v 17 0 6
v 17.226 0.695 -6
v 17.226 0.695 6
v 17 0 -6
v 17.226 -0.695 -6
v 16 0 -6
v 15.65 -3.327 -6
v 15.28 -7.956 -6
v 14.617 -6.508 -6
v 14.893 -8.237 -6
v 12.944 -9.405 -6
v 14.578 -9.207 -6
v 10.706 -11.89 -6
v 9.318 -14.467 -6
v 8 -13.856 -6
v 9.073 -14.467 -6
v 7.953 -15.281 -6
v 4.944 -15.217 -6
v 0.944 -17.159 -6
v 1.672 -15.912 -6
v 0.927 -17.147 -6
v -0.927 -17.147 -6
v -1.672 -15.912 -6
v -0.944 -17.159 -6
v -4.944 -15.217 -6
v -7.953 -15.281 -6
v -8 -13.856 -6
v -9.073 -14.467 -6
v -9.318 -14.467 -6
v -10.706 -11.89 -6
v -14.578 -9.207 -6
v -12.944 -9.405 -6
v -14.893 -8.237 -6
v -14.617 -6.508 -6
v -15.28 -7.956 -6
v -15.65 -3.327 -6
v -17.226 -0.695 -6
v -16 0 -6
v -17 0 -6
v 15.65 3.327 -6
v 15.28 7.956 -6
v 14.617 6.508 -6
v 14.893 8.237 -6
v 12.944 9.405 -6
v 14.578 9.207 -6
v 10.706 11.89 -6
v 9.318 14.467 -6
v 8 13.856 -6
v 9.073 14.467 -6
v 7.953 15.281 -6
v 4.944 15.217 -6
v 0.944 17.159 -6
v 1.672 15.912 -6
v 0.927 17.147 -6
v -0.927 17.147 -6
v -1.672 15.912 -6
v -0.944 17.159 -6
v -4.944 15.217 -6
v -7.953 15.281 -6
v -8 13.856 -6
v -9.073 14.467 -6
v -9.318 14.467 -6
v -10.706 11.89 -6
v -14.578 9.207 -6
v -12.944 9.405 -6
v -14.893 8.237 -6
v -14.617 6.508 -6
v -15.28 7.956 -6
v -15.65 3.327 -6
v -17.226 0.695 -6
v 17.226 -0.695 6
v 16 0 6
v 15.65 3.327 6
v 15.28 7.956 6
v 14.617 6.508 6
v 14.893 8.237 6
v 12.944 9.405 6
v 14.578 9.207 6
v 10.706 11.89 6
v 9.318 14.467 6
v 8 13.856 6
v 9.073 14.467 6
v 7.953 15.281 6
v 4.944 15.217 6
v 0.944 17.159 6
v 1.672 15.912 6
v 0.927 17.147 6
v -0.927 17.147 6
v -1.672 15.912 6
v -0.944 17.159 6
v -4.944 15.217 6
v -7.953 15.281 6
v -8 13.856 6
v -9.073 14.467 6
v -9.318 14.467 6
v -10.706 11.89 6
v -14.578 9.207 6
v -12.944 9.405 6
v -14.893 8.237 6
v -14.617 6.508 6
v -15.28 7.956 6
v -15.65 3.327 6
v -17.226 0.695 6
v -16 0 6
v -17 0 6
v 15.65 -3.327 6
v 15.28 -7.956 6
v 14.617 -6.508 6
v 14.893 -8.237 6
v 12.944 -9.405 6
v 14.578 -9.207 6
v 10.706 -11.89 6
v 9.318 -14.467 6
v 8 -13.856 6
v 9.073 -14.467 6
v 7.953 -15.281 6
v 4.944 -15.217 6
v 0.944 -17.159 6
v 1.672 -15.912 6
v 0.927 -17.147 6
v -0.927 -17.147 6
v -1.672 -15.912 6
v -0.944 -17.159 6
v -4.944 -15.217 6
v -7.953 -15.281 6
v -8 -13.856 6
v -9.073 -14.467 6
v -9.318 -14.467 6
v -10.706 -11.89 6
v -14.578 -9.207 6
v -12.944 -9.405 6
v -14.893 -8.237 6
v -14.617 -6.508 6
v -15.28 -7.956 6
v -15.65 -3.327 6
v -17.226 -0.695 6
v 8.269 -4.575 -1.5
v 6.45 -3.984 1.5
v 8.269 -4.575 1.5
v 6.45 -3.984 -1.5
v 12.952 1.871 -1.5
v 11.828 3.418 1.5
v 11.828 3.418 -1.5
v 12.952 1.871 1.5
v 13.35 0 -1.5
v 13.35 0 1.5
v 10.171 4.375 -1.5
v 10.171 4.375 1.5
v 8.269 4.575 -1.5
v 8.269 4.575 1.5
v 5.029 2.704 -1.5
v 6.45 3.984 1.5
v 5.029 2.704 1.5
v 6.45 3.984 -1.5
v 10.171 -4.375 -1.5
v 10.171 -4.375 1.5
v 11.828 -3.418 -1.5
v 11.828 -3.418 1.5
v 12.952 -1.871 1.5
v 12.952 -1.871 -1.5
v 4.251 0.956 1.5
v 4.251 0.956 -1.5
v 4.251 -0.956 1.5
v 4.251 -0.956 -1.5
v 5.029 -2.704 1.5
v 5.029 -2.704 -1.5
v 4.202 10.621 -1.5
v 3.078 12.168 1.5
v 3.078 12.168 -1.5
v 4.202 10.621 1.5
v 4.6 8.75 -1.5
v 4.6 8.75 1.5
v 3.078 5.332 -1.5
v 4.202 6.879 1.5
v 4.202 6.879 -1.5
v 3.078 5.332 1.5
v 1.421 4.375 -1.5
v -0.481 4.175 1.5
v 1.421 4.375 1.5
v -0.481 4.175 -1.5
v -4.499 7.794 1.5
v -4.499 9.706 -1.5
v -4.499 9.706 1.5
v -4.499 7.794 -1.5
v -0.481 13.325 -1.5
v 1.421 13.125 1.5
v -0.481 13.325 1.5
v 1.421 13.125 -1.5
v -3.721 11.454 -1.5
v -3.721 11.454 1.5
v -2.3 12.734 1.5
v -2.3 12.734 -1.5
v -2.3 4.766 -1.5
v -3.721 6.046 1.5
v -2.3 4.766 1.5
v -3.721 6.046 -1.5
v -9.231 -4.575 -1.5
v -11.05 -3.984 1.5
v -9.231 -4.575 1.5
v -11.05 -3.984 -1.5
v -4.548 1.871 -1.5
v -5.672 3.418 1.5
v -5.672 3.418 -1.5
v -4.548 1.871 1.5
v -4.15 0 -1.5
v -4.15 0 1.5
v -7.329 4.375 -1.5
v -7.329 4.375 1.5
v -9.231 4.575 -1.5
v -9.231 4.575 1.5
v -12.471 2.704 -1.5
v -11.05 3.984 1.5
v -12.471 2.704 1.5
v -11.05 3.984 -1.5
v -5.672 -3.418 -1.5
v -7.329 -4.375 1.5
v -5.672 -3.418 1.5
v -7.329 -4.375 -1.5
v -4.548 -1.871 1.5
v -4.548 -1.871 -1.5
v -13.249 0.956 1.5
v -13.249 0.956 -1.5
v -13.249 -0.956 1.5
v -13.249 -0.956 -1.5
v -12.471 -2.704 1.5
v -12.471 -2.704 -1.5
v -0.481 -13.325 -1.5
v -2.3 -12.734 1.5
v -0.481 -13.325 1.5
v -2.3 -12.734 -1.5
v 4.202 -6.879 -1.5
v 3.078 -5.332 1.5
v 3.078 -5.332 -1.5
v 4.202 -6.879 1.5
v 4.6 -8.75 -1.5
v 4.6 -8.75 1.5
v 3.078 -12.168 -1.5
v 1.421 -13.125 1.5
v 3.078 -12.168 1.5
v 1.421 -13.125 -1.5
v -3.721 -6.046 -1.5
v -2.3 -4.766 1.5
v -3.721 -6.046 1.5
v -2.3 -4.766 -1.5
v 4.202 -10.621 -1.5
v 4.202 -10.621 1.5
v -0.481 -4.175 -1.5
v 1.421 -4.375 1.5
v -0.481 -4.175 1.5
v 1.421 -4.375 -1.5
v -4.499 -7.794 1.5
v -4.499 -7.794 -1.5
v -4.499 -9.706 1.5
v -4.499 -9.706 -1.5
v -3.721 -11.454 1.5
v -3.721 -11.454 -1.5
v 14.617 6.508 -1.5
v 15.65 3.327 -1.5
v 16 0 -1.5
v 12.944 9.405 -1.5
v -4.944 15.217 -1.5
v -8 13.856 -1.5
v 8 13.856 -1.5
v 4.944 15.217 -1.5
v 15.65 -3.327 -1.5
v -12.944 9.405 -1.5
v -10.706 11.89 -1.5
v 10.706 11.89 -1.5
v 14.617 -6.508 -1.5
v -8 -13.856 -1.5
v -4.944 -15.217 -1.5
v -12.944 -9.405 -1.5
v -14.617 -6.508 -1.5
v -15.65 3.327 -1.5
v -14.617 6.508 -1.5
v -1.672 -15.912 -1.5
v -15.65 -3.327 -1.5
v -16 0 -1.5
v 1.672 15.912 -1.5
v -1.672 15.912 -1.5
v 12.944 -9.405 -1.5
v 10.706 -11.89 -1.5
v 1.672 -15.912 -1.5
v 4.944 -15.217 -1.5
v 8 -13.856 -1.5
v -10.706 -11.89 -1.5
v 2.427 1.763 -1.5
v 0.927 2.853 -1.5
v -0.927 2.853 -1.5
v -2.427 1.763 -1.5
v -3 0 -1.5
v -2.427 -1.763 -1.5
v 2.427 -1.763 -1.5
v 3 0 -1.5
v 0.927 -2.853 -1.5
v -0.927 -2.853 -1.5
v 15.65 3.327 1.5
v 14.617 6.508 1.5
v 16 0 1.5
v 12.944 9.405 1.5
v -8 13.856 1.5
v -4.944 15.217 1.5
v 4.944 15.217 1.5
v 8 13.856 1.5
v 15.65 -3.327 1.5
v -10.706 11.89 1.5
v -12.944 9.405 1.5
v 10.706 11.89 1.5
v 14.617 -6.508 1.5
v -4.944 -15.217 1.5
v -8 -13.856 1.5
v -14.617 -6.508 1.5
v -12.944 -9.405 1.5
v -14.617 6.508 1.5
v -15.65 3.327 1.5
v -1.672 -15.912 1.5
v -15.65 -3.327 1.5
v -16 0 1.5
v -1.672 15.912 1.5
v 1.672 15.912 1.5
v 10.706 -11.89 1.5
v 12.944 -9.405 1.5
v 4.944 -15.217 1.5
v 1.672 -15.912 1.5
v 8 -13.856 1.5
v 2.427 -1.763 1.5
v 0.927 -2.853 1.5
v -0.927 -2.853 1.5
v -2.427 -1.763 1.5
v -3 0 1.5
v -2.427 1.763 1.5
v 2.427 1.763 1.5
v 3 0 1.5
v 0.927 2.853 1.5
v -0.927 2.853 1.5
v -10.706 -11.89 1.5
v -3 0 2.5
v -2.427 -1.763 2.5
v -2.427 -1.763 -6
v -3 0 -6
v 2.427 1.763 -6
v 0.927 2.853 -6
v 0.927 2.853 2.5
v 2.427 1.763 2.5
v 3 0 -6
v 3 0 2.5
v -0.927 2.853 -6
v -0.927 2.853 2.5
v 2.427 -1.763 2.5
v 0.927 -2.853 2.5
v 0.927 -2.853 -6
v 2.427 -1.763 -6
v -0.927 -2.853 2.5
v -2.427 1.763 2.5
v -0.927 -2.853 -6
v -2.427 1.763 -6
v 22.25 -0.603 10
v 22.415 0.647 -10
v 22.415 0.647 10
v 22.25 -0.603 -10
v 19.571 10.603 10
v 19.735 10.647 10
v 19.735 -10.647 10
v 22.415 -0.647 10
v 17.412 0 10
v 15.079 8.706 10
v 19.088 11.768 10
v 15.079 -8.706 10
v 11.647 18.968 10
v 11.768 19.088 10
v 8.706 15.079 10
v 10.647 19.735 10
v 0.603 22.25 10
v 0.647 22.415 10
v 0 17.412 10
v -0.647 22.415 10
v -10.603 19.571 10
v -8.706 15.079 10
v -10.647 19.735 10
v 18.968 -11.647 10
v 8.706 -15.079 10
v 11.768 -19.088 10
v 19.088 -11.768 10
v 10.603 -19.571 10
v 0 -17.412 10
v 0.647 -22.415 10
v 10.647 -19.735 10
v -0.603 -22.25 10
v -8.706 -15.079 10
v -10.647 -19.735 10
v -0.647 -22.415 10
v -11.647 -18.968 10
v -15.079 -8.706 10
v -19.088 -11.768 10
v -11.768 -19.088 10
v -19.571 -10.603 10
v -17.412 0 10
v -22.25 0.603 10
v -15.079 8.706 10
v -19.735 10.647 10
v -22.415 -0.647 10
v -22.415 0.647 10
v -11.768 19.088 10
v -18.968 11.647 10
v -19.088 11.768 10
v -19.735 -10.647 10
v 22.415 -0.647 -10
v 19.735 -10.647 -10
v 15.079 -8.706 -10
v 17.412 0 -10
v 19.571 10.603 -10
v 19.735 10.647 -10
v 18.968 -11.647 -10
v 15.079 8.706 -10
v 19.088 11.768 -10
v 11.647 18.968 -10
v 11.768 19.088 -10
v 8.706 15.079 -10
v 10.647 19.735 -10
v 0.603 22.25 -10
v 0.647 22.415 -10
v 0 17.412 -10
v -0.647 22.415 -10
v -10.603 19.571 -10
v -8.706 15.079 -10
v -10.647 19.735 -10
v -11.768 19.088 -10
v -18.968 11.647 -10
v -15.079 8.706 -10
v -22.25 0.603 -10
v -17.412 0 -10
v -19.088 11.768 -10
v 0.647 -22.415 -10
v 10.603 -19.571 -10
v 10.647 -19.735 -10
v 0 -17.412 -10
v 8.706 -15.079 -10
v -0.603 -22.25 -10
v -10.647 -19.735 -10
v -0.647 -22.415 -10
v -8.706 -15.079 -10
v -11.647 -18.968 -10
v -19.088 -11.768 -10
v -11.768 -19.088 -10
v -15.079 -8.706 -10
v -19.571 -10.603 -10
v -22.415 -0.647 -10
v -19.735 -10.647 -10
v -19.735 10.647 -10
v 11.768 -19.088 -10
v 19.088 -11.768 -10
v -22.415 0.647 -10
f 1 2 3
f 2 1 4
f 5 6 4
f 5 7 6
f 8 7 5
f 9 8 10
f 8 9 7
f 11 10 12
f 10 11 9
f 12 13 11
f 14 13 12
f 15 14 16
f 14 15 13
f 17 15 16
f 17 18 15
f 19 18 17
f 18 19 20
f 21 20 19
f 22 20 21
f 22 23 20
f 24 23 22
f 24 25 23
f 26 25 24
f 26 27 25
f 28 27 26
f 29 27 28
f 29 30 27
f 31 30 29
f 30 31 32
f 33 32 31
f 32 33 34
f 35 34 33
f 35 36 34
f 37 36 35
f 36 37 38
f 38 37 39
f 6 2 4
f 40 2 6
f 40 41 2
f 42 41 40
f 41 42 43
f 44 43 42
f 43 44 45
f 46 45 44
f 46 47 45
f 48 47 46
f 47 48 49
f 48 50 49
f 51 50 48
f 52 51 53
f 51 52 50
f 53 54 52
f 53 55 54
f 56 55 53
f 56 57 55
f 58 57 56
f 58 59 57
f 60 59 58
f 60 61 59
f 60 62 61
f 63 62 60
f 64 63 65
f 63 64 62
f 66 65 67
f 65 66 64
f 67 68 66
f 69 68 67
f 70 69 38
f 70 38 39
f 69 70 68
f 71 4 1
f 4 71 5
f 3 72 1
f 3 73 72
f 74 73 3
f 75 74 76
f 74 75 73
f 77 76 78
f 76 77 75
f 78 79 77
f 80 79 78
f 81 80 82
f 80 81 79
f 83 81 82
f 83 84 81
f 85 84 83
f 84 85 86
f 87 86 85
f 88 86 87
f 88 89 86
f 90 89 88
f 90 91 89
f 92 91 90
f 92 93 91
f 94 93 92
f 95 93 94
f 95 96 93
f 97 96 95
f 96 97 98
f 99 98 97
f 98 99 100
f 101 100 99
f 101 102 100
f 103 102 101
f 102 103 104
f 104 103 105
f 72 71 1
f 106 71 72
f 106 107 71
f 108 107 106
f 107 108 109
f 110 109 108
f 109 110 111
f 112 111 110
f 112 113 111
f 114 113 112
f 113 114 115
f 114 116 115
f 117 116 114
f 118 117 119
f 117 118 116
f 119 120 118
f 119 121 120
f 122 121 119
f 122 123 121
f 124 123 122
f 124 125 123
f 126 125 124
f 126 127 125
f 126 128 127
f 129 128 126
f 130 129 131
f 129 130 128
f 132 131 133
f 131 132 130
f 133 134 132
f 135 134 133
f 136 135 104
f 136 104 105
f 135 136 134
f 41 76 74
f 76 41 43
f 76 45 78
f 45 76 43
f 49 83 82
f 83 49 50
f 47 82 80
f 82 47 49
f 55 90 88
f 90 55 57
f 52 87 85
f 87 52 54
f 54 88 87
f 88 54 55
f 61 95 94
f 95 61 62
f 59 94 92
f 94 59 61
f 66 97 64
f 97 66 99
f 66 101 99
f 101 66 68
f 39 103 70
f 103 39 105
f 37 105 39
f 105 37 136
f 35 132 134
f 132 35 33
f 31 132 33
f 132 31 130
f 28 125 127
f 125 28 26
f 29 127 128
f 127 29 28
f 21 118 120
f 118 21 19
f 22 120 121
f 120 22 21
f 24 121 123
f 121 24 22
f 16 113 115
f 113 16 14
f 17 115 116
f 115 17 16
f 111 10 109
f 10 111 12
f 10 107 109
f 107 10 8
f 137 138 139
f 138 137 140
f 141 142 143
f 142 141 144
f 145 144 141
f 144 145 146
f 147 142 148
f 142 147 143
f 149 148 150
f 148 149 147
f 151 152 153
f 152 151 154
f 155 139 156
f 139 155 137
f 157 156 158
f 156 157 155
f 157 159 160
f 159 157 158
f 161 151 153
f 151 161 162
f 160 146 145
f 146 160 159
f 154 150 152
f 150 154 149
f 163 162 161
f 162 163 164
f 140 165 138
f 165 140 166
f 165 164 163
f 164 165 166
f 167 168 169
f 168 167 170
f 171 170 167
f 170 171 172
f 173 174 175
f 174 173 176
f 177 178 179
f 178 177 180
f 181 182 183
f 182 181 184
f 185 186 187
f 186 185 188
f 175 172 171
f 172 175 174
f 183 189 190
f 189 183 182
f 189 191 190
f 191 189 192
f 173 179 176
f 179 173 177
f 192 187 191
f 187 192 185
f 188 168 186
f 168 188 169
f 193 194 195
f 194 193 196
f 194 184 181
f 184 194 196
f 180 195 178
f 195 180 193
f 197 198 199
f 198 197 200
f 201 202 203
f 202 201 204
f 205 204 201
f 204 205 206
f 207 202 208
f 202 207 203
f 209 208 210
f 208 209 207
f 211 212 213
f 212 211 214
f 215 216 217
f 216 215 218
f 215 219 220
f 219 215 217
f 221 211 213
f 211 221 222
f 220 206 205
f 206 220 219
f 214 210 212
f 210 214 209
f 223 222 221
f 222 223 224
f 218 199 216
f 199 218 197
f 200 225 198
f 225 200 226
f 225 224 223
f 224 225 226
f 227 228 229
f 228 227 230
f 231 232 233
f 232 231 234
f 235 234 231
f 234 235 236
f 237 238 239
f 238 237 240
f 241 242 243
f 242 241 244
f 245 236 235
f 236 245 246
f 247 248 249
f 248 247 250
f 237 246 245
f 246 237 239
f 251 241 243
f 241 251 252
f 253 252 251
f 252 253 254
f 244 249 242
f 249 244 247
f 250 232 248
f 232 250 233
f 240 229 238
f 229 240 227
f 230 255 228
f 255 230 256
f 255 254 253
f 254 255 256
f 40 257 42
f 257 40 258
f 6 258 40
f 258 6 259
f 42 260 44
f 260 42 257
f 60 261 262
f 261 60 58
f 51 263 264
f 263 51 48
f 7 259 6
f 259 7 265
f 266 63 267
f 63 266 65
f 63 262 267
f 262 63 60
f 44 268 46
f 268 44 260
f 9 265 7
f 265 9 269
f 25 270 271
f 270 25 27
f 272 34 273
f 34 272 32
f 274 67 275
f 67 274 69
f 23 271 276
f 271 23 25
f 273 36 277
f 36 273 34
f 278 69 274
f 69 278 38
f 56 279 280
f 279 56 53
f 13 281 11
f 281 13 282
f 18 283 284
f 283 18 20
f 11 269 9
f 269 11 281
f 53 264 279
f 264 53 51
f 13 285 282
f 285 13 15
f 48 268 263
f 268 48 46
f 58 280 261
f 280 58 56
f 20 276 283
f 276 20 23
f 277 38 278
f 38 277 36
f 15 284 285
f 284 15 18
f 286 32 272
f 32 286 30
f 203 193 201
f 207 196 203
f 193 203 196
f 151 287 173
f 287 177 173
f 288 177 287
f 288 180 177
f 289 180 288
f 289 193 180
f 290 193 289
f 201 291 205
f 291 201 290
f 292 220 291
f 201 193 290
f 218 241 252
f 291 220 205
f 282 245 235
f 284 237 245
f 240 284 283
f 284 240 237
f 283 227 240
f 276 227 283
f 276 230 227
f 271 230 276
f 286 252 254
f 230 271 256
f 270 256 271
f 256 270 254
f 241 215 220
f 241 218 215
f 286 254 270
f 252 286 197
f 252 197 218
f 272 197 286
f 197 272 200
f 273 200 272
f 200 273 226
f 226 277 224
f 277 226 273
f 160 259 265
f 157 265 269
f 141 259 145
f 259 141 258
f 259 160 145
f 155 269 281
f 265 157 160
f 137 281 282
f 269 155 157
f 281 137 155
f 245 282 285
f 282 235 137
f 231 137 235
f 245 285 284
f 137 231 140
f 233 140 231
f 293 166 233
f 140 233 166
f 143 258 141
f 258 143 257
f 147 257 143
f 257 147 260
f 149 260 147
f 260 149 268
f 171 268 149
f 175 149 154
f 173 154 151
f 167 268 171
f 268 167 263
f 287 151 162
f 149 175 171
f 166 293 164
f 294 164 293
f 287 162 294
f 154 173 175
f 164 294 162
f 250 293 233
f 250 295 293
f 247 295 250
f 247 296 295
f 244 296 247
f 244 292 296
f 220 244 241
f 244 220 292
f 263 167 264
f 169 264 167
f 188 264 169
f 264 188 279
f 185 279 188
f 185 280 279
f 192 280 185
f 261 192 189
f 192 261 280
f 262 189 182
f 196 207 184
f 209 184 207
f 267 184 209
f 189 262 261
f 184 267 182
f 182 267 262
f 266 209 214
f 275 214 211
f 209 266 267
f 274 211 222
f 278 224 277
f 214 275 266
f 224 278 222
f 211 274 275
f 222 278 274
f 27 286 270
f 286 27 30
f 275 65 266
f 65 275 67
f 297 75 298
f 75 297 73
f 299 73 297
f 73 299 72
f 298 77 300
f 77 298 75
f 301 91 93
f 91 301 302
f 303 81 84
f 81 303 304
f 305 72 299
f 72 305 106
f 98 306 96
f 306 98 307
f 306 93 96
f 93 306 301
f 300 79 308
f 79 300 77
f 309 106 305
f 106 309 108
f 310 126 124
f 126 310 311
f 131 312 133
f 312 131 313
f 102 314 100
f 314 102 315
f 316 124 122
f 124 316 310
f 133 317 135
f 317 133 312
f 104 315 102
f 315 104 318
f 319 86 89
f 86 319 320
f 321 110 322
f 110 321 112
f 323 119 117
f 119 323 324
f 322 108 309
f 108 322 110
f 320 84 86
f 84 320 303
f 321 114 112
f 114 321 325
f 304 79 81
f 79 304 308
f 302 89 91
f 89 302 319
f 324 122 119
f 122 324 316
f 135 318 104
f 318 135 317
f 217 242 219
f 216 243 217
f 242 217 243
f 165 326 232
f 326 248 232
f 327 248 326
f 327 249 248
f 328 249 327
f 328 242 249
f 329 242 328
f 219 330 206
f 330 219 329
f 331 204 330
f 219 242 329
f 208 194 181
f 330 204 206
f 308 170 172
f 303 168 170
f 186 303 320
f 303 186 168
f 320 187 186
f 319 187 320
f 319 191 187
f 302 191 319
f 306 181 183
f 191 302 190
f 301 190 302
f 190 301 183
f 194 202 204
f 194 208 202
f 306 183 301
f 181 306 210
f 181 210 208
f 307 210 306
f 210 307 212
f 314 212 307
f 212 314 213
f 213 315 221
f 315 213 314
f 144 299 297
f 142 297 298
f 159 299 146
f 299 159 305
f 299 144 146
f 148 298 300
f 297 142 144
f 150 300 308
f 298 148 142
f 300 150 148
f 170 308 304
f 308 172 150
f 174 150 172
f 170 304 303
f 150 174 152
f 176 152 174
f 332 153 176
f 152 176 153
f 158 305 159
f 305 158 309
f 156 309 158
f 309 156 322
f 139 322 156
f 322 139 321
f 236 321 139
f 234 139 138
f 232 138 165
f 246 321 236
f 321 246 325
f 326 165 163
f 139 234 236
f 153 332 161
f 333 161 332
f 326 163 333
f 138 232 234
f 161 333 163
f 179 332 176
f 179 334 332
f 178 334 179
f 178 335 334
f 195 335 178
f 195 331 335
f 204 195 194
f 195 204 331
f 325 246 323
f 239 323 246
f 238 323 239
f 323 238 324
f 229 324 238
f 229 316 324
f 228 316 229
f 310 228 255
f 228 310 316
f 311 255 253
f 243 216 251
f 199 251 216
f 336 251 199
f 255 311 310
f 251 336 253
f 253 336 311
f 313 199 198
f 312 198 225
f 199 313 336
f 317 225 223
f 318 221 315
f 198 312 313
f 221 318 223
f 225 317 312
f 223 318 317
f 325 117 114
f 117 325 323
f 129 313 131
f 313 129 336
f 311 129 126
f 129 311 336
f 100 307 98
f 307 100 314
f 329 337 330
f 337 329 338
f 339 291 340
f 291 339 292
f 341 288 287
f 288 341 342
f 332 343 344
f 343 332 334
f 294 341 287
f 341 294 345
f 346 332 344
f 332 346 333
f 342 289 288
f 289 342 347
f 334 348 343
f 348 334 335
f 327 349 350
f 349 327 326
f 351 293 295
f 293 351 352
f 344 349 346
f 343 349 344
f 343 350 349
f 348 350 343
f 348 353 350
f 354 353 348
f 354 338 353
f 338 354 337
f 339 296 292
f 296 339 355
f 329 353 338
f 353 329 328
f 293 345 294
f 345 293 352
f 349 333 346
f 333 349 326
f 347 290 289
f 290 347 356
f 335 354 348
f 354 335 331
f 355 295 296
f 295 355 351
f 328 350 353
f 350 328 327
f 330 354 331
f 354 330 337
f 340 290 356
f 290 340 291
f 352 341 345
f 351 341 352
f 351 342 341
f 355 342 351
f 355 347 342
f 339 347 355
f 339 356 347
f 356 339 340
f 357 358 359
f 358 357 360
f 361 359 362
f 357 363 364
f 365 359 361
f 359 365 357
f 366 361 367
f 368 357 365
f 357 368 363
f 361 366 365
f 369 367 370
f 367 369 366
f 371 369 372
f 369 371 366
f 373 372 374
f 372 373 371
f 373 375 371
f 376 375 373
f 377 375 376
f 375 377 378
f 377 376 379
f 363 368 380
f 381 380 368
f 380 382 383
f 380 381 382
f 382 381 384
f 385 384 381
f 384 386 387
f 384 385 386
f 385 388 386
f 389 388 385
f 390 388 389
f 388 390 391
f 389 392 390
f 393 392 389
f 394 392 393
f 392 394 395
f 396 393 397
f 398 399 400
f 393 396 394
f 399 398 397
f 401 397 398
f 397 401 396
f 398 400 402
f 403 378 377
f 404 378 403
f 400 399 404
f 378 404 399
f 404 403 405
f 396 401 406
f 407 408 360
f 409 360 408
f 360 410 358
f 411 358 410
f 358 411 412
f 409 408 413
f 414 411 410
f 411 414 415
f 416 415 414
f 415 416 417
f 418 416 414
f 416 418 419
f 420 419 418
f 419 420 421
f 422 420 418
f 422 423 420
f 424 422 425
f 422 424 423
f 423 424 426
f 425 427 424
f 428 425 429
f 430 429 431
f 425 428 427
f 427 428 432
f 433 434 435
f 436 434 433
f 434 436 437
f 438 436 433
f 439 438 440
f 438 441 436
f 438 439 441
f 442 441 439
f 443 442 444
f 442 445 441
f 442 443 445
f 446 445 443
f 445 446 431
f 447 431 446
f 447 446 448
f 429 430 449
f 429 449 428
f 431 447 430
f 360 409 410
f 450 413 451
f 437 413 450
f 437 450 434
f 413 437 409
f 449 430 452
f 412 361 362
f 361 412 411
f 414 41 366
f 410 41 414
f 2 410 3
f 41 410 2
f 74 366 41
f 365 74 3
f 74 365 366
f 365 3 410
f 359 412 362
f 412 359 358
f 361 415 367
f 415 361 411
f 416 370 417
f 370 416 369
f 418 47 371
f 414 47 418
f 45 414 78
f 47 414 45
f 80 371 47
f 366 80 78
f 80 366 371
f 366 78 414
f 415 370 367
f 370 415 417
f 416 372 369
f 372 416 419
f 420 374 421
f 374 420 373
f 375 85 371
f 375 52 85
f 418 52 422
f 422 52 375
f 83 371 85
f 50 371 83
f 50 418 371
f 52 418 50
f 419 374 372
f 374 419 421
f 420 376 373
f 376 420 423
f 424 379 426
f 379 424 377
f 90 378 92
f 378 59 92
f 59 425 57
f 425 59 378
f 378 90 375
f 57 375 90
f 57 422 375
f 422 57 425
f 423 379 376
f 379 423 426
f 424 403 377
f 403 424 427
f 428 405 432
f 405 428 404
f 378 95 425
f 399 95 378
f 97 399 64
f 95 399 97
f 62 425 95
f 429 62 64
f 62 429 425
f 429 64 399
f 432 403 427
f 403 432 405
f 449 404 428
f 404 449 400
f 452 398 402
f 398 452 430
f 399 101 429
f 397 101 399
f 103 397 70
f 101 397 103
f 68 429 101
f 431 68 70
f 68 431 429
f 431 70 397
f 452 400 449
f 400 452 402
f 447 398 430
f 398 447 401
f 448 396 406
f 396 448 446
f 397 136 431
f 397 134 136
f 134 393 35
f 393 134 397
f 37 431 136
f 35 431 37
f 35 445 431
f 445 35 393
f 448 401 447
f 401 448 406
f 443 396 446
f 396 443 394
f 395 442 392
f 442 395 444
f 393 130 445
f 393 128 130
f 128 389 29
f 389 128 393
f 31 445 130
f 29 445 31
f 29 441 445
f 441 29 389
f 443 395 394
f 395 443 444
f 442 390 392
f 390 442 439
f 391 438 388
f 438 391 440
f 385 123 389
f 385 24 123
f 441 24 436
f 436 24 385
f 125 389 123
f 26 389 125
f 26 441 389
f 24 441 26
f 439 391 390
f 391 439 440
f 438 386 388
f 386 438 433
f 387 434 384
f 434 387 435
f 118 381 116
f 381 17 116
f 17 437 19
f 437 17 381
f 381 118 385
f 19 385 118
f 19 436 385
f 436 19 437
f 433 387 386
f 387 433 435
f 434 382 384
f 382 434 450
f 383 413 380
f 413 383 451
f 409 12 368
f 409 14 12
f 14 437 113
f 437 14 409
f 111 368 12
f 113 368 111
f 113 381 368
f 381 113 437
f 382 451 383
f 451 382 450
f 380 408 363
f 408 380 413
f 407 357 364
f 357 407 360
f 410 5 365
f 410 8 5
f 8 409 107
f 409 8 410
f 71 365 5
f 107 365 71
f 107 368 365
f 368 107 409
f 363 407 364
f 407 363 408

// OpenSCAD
// All dimensions in mm

treadWidth = 20;              // Width of the treads
toothDiameter = 5;            // Diameter of the tooth on the link
linkLength = 20;              // Length of a link
linkThickness = 3;            // Thinkness of the tread bit of the lin

driveWheelWidth = 12;
driveWheelDiameter = 40;      // Diameter of the drive wheel
driveWheelTeeth = 12;         // Number of teeth on the drive wheel

hubDiameter = 6;              // Diameter of the center shaft on wheel
rimThickness = 3;             // Thickness of the rim not including teeth
spokeThickness = 3;           // Thickness of the spokes

//linkBase();
//driveWheelBase();
testLinksAroundWheel();

module linkBase(rot=0) {
  toothSeperation = 2 * sin(360/driveWheelTeeth/2) * driveWheelDiameter/2;
  
  rotate([0,0,rot]) {
    cylinder(treadWidth, d=toothDiameter);
    translate([0, -toothDiameter/2, 0])
      cube([toothSeperation, toothDiameter, treadWidth]);
  }
}

module driveWheelBase() {
  r = driveWheelDiameter / 2;
  w = driveWheelWidth;
  difference() {
    // Blank
    cylinder(w, r=r);
    // Teeth
    for (n = [0 : driveWheelTeeth - 1]) {
      deg = 360 / driveWheelTeeth * n;
      translate([r*cos(deg), r*sin(deg), 0])
        cylinder(w, d=toothDiameter+1);
    }
    // Center cutouts
    cylinder(w/2-spokeThickness/2, r=r-toothDiameter/2-spokeThickness/2);
    translate([0, 0, w/2+spokeThickness/2]) 
      cylinder(w/2-spokeThickness/2, r=r-toothDiameter/2-spokeThickness/2);
    // Spoke holes
    spokeCenter = (r-toothDiameter/2-rimThickness+hubDiameter/2)/2;
    spokeRadius = 0.8*(spokeCenter - hubDiameter/2);
    for (n = [0 : 3]) {
      deg = 360 / 4 * n;
      translate([spokeCenter*cos(deg), spokeCenter*sin(deg), 0])
        cylinder(w, r=spokeRadius);
    }
  }
  // Hub
  cylinder(w/2+spokeThickness/2+1, d=hubDiameter);
}

module testLinksAroundWheel() {
  translate([0, 0, -driveWheelWidth/2]) 
    color("blue") 
      driveWheelBase();
  
  r = driveWheelDiameter / 2;
  for (n = [0 : driveWheelTeeth - 1]) {
      deg = 360 / driveWheelTeeth * n;
      translate([r*cos(deg), r*sin(deg), -treadWidth/2])
        linkBase(deg+90+360/driveWheelWidth/2);
    }
  
}
 
